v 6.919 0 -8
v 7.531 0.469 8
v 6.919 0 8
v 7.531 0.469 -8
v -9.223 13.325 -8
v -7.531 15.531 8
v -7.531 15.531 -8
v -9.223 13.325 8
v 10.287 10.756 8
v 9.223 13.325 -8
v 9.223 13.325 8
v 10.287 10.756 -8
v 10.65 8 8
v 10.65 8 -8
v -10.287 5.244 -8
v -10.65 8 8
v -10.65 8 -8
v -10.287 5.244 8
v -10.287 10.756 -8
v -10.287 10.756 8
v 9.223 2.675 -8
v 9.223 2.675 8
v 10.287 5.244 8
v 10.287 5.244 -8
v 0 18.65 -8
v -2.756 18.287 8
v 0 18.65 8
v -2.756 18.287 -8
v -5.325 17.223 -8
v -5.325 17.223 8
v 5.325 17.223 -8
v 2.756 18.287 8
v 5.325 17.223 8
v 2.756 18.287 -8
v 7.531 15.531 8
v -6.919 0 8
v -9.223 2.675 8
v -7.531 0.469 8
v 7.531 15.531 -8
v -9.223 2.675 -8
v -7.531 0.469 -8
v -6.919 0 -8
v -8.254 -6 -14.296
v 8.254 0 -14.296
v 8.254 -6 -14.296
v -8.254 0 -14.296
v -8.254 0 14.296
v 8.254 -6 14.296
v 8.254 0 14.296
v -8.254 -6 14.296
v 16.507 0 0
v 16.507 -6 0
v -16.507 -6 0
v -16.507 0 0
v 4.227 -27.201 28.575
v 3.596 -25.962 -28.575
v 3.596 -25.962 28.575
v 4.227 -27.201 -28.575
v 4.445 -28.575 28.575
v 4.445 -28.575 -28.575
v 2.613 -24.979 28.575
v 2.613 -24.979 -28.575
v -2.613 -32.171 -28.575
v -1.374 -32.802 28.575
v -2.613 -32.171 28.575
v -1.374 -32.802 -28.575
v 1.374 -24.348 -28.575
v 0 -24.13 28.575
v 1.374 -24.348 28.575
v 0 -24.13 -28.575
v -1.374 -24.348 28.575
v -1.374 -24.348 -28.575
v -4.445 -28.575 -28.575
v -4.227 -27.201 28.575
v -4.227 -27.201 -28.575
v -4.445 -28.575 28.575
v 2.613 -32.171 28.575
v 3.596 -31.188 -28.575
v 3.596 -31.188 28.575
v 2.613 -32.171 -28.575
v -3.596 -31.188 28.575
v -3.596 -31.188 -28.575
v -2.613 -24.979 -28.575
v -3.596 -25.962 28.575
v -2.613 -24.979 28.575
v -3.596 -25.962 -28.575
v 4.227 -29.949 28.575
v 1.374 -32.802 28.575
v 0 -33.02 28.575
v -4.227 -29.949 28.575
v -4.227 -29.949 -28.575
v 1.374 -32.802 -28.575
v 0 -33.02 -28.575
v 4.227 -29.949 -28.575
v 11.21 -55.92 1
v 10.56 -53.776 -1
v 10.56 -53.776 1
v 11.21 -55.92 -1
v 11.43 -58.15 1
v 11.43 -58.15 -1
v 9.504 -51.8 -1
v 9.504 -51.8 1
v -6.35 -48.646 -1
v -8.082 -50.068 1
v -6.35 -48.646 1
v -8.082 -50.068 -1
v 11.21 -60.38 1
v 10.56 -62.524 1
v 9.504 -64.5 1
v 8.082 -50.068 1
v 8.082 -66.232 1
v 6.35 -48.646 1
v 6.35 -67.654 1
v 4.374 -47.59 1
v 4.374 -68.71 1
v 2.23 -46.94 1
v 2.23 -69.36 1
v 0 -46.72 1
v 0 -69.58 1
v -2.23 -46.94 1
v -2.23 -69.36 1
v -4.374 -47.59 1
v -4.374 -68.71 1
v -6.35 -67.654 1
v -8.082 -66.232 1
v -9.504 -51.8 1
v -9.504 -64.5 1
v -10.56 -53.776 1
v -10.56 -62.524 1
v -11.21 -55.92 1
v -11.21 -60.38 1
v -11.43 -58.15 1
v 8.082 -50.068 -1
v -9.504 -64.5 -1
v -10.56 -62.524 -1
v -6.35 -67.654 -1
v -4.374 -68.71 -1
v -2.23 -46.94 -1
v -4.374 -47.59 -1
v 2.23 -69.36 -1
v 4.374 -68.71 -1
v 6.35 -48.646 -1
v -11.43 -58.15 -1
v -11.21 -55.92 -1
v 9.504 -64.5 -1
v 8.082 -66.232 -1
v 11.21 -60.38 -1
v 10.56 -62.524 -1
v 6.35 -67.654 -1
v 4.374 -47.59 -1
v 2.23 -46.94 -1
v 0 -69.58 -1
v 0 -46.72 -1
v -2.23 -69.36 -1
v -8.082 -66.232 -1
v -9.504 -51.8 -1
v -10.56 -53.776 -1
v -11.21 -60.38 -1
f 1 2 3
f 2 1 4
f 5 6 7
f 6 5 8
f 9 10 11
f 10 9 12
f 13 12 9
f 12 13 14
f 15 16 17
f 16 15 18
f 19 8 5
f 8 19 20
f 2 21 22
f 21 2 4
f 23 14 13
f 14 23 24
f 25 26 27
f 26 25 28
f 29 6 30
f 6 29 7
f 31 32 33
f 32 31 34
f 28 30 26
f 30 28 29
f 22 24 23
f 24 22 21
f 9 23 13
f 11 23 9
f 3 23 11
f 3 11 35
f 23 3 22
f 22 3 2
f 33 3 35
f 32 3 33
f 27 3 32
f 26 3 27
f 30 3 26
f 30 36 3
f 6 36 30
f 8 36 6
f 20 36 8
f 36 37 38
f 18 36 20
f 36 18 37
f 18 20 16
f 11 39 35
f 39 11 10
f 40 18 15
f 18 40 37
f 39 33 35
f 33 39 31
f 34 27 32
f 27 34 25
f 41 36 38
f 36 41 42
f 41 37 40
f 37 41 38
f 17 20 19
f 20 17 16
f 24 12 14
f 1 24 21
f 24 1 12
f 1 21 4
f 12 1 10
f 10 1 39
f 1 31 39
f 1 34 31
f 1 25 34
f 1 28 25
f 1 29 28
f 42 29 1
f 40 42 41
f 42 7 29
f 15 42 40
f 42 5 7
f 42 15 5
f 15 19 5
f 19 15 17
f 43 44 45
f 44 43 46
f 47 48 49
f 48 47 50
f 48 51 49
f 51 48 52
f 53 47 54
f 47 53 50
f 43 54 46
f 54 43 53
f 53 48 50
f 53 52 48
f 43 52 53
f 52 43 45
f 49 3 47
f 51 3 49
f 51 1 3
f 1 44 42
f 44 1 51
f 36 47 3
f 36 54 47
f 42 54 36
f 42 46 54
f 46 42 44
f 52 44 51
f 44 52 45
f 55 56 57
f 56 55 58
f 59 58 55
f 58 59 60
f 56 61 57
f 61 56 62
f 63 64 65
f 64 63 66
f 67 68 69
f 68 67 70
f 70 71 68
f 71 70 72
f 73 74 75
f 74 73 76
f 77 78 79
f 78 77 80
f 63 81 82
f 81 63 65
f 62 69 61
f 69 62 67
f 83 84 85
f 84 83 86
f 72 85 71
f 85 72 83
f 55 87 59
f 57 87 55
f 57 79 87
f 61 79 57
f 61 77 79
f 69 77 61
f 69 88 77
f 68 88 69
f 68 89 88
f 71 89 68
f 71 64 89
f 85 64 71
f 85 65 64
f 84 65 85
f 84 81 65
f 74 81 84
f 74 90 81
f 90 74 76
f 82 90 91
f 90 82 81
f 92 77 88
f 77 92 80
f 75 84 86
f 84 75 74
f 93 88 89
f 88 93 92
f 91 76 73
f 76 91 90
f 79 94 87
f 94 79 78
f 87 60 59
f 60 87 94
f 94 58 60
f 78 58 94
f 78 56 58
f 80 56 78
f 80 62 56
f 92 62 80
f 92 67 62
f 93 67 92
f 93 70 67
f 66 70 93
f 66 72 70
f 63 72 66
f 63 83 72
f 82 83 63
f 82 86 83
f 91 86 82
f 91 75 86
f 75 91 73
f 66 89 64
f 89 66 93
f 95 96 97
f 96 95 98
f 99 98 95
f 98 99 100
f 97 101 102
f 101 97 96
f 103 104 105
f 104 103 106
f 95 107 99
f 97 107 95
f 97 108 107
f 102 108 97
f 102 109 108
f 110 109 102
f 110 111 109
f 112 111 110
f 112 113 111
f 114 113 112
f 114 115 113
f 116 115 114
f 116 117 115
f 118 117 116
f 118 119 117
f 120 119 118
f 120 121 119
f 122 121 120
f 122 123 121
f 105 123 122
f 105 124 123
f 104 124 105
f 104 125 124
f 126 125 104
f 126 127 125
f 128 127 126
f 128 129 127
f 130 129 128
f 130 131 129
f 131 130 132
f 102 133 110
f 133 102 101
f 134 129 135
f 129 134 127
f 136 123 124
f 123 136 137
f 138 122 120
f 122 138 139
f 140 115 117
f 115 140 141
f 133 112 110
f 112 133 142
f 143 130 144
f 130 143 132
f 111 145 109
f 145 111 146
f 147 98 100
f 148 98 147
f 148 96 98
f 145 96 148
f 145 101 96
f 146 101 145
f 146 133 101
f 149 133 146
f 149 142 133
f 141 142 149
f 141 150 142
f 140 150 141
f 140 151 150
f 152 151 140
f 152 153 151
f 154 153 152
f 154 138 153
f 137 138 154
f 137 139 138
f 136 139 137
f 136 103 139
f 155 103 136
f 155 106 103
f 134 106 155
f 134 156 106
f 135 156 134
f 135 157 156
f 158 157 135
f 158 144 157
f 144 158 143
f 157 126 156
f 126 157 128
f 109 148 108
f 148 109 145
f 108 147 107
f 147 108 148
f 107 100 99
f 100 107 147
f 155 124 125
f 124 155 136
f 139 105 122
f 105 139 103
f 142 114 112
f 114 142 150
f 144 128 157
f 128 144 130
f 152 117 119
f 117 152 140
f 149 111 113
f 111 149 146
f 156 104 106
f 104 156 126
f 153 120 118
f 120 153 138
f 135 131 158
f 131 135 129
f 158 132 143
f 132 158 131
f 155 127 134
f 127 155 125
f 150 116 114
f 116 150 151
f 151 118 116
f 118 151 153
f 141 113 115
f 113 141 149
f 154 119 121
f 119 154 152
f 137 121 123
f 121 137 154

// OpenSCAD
// Auto-generated by scripts/author_from_manifest.py (Phase D.3).
// Source: data/phase_d_manifest.json (sku_intent='reliable-f1res58-pendent-155f').
// Do not hand-edit — regenerate from the manifest.
//
// @part reliable_f1res58_pendent_155f
// @kind sprinkler_head
// @category head.pendant.k58
// @display-name "Reliable F1Res 58 Residential Pendent K5.8 155°F"
// @mfg reliable_automatic_sprinkler
// @mfg-pn F1Res_58
// @listing UL FM
// @hazard-classes LH
// @price-usd 17.25
// @install-minutes 8
// @crew journeyman
// @k-factor 5.8
// @orientation pendant
// @response quick
// @temperature 155F
// @param size_in number default=0.5 label="Size" unit="in"
// @port inlet position=[0,0.014,0] direction=[0,1,0] style=NPT_threaded size_in=0.5 role=drop

size_in = 0.5;
k_factor = 5.8;

length_mm   = 57.15;
body_dia_mm = 25.40;
thread_od   = 21.3;
thread_len  = 16;
deflector_d = body_dia_mm * 0.9;

 union() {
    translate([0, thread_len/2, 0])
        cylinder(h = thread_len, d = thread_od, center = true, $fn = 24);
    translate([0, -3, 0])
        rotate([90, 0, 0])
        cylinder(h = 6, d = thread_od * 1.55, $fn = 6, center = true);
    translate([0, -length_mm/2, 0])
        cylinder(h = length_mm, d = body_dia_mm * 0.35, center = true, $fn = 20);
    translate([0, -length_mm - 1, 0])
        cylinder(h = 2, d = deflector_d, center = true, $fn = 32);
}
